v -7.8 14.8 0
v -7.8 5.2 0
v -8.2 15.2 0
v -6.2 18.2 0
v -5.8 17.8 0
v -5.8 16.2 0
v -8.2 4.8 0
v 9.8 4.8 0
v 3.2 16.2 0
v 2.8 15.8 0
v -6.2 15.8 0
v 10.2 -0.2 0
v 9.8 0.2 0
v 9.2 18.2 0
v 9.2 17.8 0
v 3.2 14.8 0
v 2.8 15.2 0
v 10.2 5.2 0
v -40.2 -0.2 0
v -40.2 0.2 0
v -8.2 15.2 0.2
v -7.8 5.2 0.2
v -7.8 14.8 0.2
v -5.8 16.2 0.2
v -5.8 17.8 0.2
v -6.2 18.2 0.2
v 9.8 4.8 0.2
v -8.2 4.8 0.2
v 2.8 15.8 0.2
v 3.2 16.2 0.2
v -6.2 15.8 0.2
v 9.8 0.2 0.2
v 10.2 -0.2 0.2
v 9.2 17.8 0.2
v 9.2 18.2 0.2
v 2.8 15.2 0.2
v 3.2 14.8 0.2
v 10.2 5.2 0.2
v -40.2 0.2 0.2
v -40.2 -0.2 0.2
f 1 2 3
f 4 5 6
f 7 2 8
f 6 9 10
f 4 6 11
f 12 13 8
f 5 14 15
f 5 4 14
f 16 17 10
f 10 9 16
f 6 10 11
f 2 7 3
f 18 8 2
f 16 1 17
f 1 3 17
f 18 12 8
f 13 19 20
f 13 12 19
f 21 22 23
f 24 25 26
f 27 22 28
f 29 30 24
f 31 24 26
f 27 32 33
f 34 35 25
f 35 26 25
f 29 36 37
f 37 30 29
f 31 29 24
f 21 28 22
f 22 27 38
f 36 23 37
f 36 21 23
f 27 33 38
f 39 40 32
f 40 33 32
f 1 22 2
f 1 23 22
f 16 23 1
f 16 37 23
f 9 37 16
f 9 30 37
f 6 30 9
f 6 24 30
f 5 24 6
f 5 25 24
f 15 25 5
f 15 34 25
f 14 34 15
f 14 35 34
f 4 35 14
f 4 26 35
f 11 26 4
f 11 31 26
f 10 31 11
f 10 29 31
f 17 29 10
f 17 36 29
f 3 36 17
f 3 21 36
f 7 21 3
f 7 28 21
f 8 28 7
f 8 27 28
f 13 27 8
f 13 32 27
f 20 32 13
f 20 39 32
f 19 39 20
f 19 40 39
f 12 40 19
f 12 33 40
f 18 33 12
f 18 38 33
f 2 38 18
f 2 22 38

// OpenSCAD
// file: ../../api/v2/reporting.scad
//////////////////////////////////////////////////////////////////////
// LibFile: reporting.scad
// Project: Grid Stack
// FileGroup: API v2 Reporting
// FileSummary: Console report for immutable primitive-trace print recipes.
// Role: Makes the exact material, nozzle, printer status, layer height,
//       trace lengths, repeat distances, and source identity visible.
// Requires: API v2 indexes and parallel-trace/path helpers.
// Exports: report_first_layer_object().
//////////////////////////////////////////////////////////////////////

module report_first_layer_object(object, report_level = "full") {
    material = object[FLO_MATERIAL];
    nozzle = object[FLO_NOZZLE];
    printer = object[FLO_PRINTER];
    process = object[FLO_PROCESS];
    traces = object[FLO_TRACES];
    orientation = object[FLO_ORIENTATION];
    lead_in = object[FLO_LEAD_IN];
    points = parallel_trace_path(traces, orientation, lead_in);

    assert(report_level == "summary" || report_level == "full",
        "Report level must be summary or full.");

    echo("------------------------------------------------------------");
    echo("GRID STACK API V2 SAVED FIRST-LAYER OBJECT");
    echo(str("Object: ", object[FLO_NAME]));
    echo(str("Revision: ", object[FLO_REVISION]));
    echo(str("Source release: ", object[FLO_SOURCE_RELEASE]));
    echo(str("Source commit: ", object[FLO_SOURCE_COMMIT]));
    echo(str("Status: ", object[FLO_STATUS]));
    echo(str("Material: ", material[MAT_FAMILY]));
    echo(str("Nozzle: ", nozzle[NZ_DIAMETER], " mm"));
    echo(str("Layer height: ", process[TP_LAYER_H], " mm"));
    echo(str("Printer record: ", printer[PRN_NAME],
        " (", printer[PRN_STATUS], ")"));
    echo(str("Trace orientation: ", orientation, " degrees"));
    echo(str("Trace count: ", len(traces)));
    echo(str("Trace lengths: ", parallel_trace_lengths(traces)));
    echo(str("Repeat distances: ", trace_repeat_distances(traces)));
    echo(str("Clear gaps: ",
        trace_clear_gaps(traces, nozzle[NZ_DIAMETER])));
    echo(str("Lead-in: ", lead_in, " mm"));
    echo(str("Continuous path length: ", path_length(points), " mm"));

    if (report_level == "full") {
        echo(str("Material record: ", material));
        echo(str("Nozzle record: ", nozzle));
        echo(str("Printer record: ", printer));
        echo(str("Trace-process record: ", process));
        echo(str("Trace records: ", traces));
        echo(str("Ordered path: ", points));
        echo(str("Notes: ", object[FLO_NOTES]));
    }

    echo("------------------------------------------------------------");
}
// file: ../../api/v2/validation.scad
//////////////////////////////////////////////////////////////////////
// LibFile: validation.scad
// Project: Grid Stack
// FileGroup: API v2 Validation
// FileSummary: Validates immutable primitive-trace print recipes.
// Role: Rejects incomplete environments, nonparallel traces, diagonal turns,
//       incompatible API/schema versions, and misleading print records.
// Requires: API v2 indexes, path math, and parallel-trace helpers.
// Exports: validate_first_layer_object().
//////////////////////////////////////////////////////////////////////

function _v2_is_integer(value) = is_num(value) && floor(value) == value;

module _validate_material(material) {
    assert(len(material) == 5,
        "API v2 material record has an unexpected field count.");
    assert(material[MAT_NAME] != "", "Material name cannot be empty.");
    assert(material[MAT_STATUS] == "in_use" ||
           material[MAT_STATUS] == "retired",
        "Material status must be in_use or retired.");
}

module _validate_nozzle(nozzle) {
    assert(len(nozzle) == 5,
        "API v2 nozzle record has an unexpected field count.");
    assert(nozzle[NZ_NAME] != "", "Nozzle name cannot be empty.");
    assert(nozzle[NZ_DIAMETER] > 0,
        "Nozzle diameter must be positive.");
    assert(nozzle[NZ_STATUS] == "in_use" ||
           nozzle[NZ_STATUS] == "retired",
        "Nozzle status must be in_use or retired.");
}

module _validate_printer(printer) {
    assert(len(printer) == 7,
        "API v2 printer record has an unexpected field count.");
    assert(printer[PRN_NAME] != "", "Printer name cannot be empty.");
    assert(printer[PRN_STATUS] == "recorded" ||
           printer[PRN_STATUS] == "unrecorded" ||
           printer[PRN_STATUS] == "retired",
        "Printer status must be recorded, unrecorded, or retired.");

    if (printer[PRN_STATUS] == "recorded") {
        assert(printer[PRN_MANUFACTURER] != "",
            "A recorded printer requires a manufacturer.");
        assert(printer[PRN_MODEL] != "",
            "A recorded printer requires a model.");
    }
}

module _validate_trace_process(process, material, nozzle, printer) {
    assert(len(process) == 8,
        "API v2 trace-process record has an unexpected field count.");
    assert(process[TP_NAME] != "",
        "Trace-process name cannot be empty.");
    assert(process[TP_MATERIAL] == material[MAT_NAME],
        "Trace process material does not match the embedded material.");
    assert(process[TP_NOZZLE] == nozzle[NZ_NAME],
        "Trace process nozzle does not match the embedded nozzle.");
    assert(process[TP_PRINTER] == printer[PRN_NAME],
        "Trace process printer does not match the embedded printer.");
    assert(process[TP_LAYER_H] > 0,
        "Deposited layer height must be positive.");
    assert(process[TP_LAYER_H] <= nozzle[NZ_DIAMETER],
        "Deposited layer height must not exceed nozzle diameter.");
    assert(process[TP_QUALIFICATION] == "owner_tested" ||
           process[TP_QUALIFICATION] == "unqualified",
        "Trace-process qualification must be owner_tested or unqualified.");
    assert(_v2_is_integer(process[TP_REVISION]) &&
           process[TP_REVISION] >= 1,
        "Trace-process revision must be a positive integer.");
}

module _validate_parallel_traces(traces, orientation, trace_width, lead_in) {
    assert(len(traces) >= 1,
        "At least one parallel trace must be configured.");
    assert(orientation == 0 || orientation == 90,
        "Trace orientation must be 0 or 90 degrees.");
    assert(trace_width > 0,
        "Trace width must be positive.");
    assert(lead_in >= 0,
        "Lead-in must be zero or positive.");

    for (i = [0 : len(traces) - 1]) {
        trace = traces[i];
        assert(len(trace) == 3,
            str("Trace ", i,
                " must be [axis_min, axis_max, perpendicular_position]."));
        assert(is_num(trace[PTR_AXIS_MIN]) &&
               is_num(trace[PTR_AXIS_MAX]) &&
               is_num(trace[PTR_OFFSET]),
            str("Trace ", i, " fields must be numeric."));
        assert(trace[PTR_AXIS_MAX] > trace[PTR_AXIS_MIN],
            str("Trace ", i,
                " axis_max must be greater than axis_min."));
    }

    if (len(traces) >= 2) {
        offset_direction = traces[1][PTR_OFFSET] > traces[0][PTR_OFFSET]
            ? 1 : -1;

        for (i = [0 : len(traces) - 2]) {
            repeat_distance = abs(
                traces[i + 1][PTR_OFFSET] - traces[i][PTR_OFFSET]
            );
            next_direction = traces[i + 1][PTR_OFFSET] -
                             traces[i][PTR_OFFSET];

            assert(next_direction * offset_direction > 0,
                "Parallel-trace offsets must remain strictly monotonic.");
            assert(repeat_distance >= trace_width,
                str("Trace repeat distance ", repeat_distance,
                    " is smaller than trace width ", trace_width, "."));
            assert(nearly_equal(
                    trace_path_end_axis(traces[i], i),
                    trace_path_start_axis(traces[i + 1], i + 1)
                ),
                str("Traces ", i, " and ", i + 1,
                    " do not share the endpoint required for a square turn."));
        }
    }

    points = parallel_trace_path(traces, orientation, lead_in);
    assert(len(points) >= 2,
        "Generated path requires at least two points.");
    assert(!path_has_zero_length_segment(points),
        "Generated path contains a zero-length segment.");
    assert(path_is_axis_aligned(points),
        "Generated path must remain axis-aligned.");
    assert(path_start(points) != path_end(points),
        "Generated path must remain open.");
}

// Module: validate_first_layer_object()
// Synopsis: Validates one API v2 immutable first-layer recipe.
module validate_first_layer_object(object) {
    assert(len(object) == 15,
        "API v2 first-layer object has an unexpected field count.");
    assert(object[FLO_NAME] != "",
        "First-layer object name must not be empty.");
    assert(_v2_is_integer(object[FLO_REVISION]) &&
           object[FLO_REVISION] >= 1,
        "First-layer object revision must be a positive integer.");
    assert(object[FLO_REQUIRED_API] == GRID_STACK_API_VERSION,
        str("Recipe requires Grid Stack API ",
            object[FLO_REQUIRED_API], " but loaded API is ",
            GRID_STACK_API_VERSION, "."));
    assert(object[FLO_SCHEMA_VERSION] ==
           GRID_STACK_FIRST_LAYER_SCHEMA_VERSION,
        str("Recipe schema ", object[FLO_SCHEMA_VERSION],
            " is incompatible with loaded schema ",
            GRID_STACK_FIRST_LAYER_SCHEMA_VERSION, "."));
    assert(object[FLO_SOURCE_RELEASE] != "",
        "Recipe must record its source release.");
    assert(object[FLO_SOURCE_COMMIT] != "",
        "Recipe must record its accepted source commit.");
    assert(object[FLO_STATUS] == "calibration" ||
           object[FLO_STATUS] == "printed" ||
           object[FLO_STATUS] == "retired",
        "Recipe status must be calibration, printed, or retired.");

    material = object[FLO_MATERIAL];
    nozzle = object[FLO_NOZZLE];
    printer = object[FLO_PRINTER];
    process = object[FLO_PROCESS];

    _validate_material(material);
    _validate_nozzle(nozzle);
    _validate_printer(printer);
    _validate_trace_process(process, material, nozzle, printer);
    _validate_parallel_traces(
        object[FLO_TRACES],
        object[FLO_ORIENTATION],
        nozzle[NZ_DIAMETER],
        object[FLO_LEAD_IN]
    );

    if (object[FLO_STATUS] == "printed")
        assert(process[TP_QUALIFICATION] == "owner_tested",
            "A printed recipe must use an owner-tested trace process.");

    echo("GRID STACK API V2 FIRST-LAYER VALIDATION: PASS");
}
// file: ../../geometry/trace_layer.scad
//////////////////////////////////////////////////////////////////////
// LibFile: trace_layer.scad
// Project: Grid Stack
// FileGroup: Printable Geometry
// FileSummary: Sweeps one rectangular nozzle trace along an axis-aligned path
//              using square segment ends and square perpendicular turns.
// Role: Creates the first printable Grid Stack primitive: one trace wide and
//       one deposited layer high. It is not a structural strand.
// Requires: An ordered, validated, axis-aligned XY point list.
// Exports: square_trace_path_2d() and printable_trace_layer().
//////////////////////////////////////////////////////////////////////

// Module: _square_trace_segment_2d()
// Synopsis: Creates one centered axis-aligned segment with square end caps.
module _square_trace_segment_2d(a, b, width) {
    horizontal = nearly_equal(a[1], b[1]);
    vertical = nearly_equal(a[0], b[0]);

    assert(horizontal || vertical,
        "Printable trace segments must be horizontal or vertical.");
    assert(!nearly_equal(point_distance_2d(a, b), 0),
        "Printable trace segments must have nonzero length.");

    if (horizontal)
        translate([min(a[0], b[0]) - width / 2, a[1] - width / 2])
            square([abs(b[0] - a[0]) + width, width]);
    else
        translate([a[0] - width / 2, min(a[1], b[1]) - width / 2])
            square([width, abs(b[1] - a[1]) + width]);
}

// Module: square_trace_path_2d()
// Synopsis: Unions square-ended segments into one continuous 2D trace.
module square_trace_path_2d(points, width) {
    assert(len(points) >= 2,
        "A printable trace path requires at least two points.");
    assert(width > 0,
        "Printable trace width must be positive.");

    union()
        for (i = [0 : len(points) - 2])
            _square_trace_segment_2d(points[i], points[i + 1], width);
}

// Module: printable_trace_layer()
// Synopsis: Extrudes one trace-width path to one deposited-layer height.
// Description:
//   The start, termination, and every perpendicular turn remain square.
//   This primitive intentionally represents one nozzle trace and one layer.
module printable_trace_layer(points, trace_width, trace_height) {
    assert(trace_height > 0,
        "Printable trace height must be positive.");

    linear_extrude(height = trace_height, convexity = 10)
        square_trace_path_2d(points, trace_width);
}
// file: ../../geometry/path_preview.scad
//////////////////////////////////////////////////////////////////////
// LibFile: path_preview.scad
// Project: Grid Stack
// FileGroup: Diagnostic Geometry
// FileSummary: Displays an ordered centerline, point order, start/end markers,
//              and the non-printing coupon envelope.
// Role: Supports path inspection only. It is not structural-strand geometry.
// Requires: An ordered list of XY points.
// Exports: diagnostic_path_preview().
//////////////////////////////////////////////////////////////////////

module _preview_segment_2d(a, b, width) {
    hull() {
        translate(a) circle(d = width, $fn = 16);
        translate(b) circle(d = width, $fn = 16);
    }
}

module _preview_polyline_2d(points, width) {
    for (i = [0 : len(points) - 2])
        _preview_segment_2d(points[i], points[i + 1], width);
}

module _preview_point_label(point, index, label_size) {
    translate([point[0] + label_size * 0.35, point[1] + label_size * 0.15])
        text(str(index), size = label_size, halign = "left", valign = "bottom");
}

// Module: diagnostic_path_preview()
// Synopsis: Renders a deliberately thin, non-printable path diagnostic.
// Description:
//   Point 0 is the lead-in start. The last point is the only path end.
//   The translucent rectangle is an envelope reference, not a perimeter path.
module diagnostic_path_preview(
    points,
    boundary_size,
    show_envelope = true,
    show_point_numbers = true,
    line_width = 0.18,
    marker_diameter = 1.2,
    label_size = 1.5
) {
    if (show_envelope)
        %color([0.75, 0.75, 0.75, 0.25])
            linear_extrude(height = 0.02)
                square(boundary_size);

    color("orange")
        linear_extrude(height = 0.08)
            _preview_polyline_2d(points, line_width);

    color("green")
        translate([points[0][0], points[0][1], 0])
            cylinder(h = 0.12, d = marker_diameter, $fn = 24);

    color("red")
        translate([points[len(points) - 1][0], points[len(points) - 1][1], 0])
            cylinder(h = 0.12, d = marker_diameter, $fn = 24);

    if (show_point_numbers)
        color("black")
            linear_extrude(height = 0.1)
                for (i = [0 : len(points) - 1])
                    _preview_point_label(points[i], i, label_size);
}
// file: ../../paths/parallel_traces.scad
//////////////////////////////////////////////////////////////////////
// LibFile: parallel_traces.scad
// Project: Grid Stack
// FileGroup: Path Generation
// FileSummary: Converts configurable parallel-trace records into one ordered,
//              continuous path with square perpendicular connectors.
// Role: Treats every trace length and repeat distance as independent data.
//       No equal spacing, equal length, symmetry, or square-wave repetition is
//       implied by this generator.
// Requires: Path mathematics and parallel-trace field indexes.
// Exports: parallel_trace_path(), trace_axis_length(), trace_repeat_distances(),
//          trace_clear_gaps(), and trace-path endpoint helpers.
//////////////////////////////////////////////////////////////////////

// Function: trace_axis_length()
// Synopsis: Returns the independently configured length of one parallel trace.
function trace_axis_length(trace) = trace[PTR_AXIS_MAX] - trace[PTR_AXIS_MIN];

// Function: trace_path_start_axis()
// Synopsis: Returns the traversal start coordinate for a trace by parity.
// Description:
//   Even traces run from axis_min to axis_max. Odd traces run from axis_max
//   to axis_min. This alternation preserves one continuous serpentine path.
function trace_path_start_axis(trace, index) =
    index % 2 == 0 ? trace[PTR_AXIS_MIN] : trace[PTR_AXIS_MAX];

// Function: trace_path_end_axis()
// Synopsis: Returns the traversal end coordinate for a trace by parity.
function trace_path_end_axis(trace, index) =
    index % 2 == 0 ? trace[PTR_AXIS_MAX] : trace[PTR_AXIS_MIN];

// Function: _parallel_trace_point()
// Synopsis: Maps one axis coordinate and one perpendicular offset into XY.
function _parallel_trace_point(axis_value, offset, orientation) =
    orientation == 0 ? [axis_value, offset] : [offset, axis_value];

// Function: _parallel_trace_points()
// Synopsis: Recursively expands trace records into entry and exit points.
function _parallel_trace_points(traces, orientation, index = 0) =
    index >= len(traces)
        ? []
        : let(
            trace = traces[index],
            offset = trace[PTR_OFFSET],
            start_point = _parallel_trace_point(
                trace_path_start_axis(trace, index), offset, orientation
            ),
            end_point = _parallel_trace_point(
                trace_path_end_axis(trace, index), offset, orientation
            )
        )
        concat(
            [start_point, end_point],
            _parallel_trace_points(traces, orientation, index + 1)
        );

// Function: parallel_trace_path()
// Synopsis: Returns one open ordered path through all configured traces.
// Arguments:
//   traces = Records of [axis_min, axis_max, perpendicular_position].
//   orientation = 0 for X-running traces or 90 for Y-running traces.
//   lead_in = Straight entry length before the first trace, in millimeters.
// Description:
//   Adjacent records must share the alternating endpoint used by their turn.
//   The path therefore connects traces only with perpendicular square turns.
//   Every trace length and every offset difference may be different.
function parallel_trace_path(traces, orientation = 0, lead_in = 0) =
    assert(len(traces) >= 1,
        "A parallel-trace path requires at least one trace record.")
    assert(orientation == 0 || orientation == 90,
        "Parallel-trace orientation must be 0 or 90 degrees.")
    assert(lead_in >= 0,
        "Parallel-trace lead-in must be zero or positive.")
    let(
        body = _parallel_trace_points(traces, orientation),
        first = body[0],
        lead_start = orientation == 0
            ? [first[0] - lead_in, first[1]]
            : [first[0], first[1] - lead_in]
    )
    lead_in > 0 ? concat([lead_start], body) : body;

// Function: trace_repeat_distances()
// Synopsis: Returns centerline-to-centerline repeat distances between traces.
function trace_repeat_distances(traces) =
    len(traces) < 2
        ? []
        : [for (i = [0 : len(traces) - 2])
            abs(traces[i + 1][PTR_OFFSET] - traces[i][PTR_OFFSET])];

// Function: trace_clear_gaps()
// Synopsis: Returns clear edge-to-edge gaps for a specified trace width.
function trace_clear_gaps(traces, trace_width) =
    [for (distance = trace_repeat_distances(traces))
        distance - trace_width];

// Function: parallel_trace_lengths()
// Synopsis: Returns the independently configured lengths of all traces.
function parallel_trace_lengths(traces) =
    [for (trace = traces) trace_axis_length(trace)];

// Function: path_bounds_2d()
// Synopsis: Returns [min_x, max_x, min_y, max_y] for an ordered XY path.
function path_bounds_2d(points) = [
    min([for (point = points) point[0]]),
    max([for (point = points) point[0]]),
    min([for (point = points) point[1]]),
    max([for (point = points) point[1]])
];
// file: ../../lib/path_math.scad
//////////////////////////////////////////////////////////////////////
// LibFile: path_math.scad
// Project: Grid Stack
// FileGroup: Path Mathematics
// FileSummary: Pure helpers for ordered two-dimensional nozzle paths.
// Role: Measures and inspects point lists without creating geometry or
//       selecting project records.
// Requires: nearly_equal() from list_math.scad.
// Exports: Point, segment, path-length, and continuity helpers.
//////////////////////////////////////////////////////////////////////

// Function: point_distance_2d()
// Synopsis: Returns the Euclidean distance between two XY points.
function point_distance_2d(a, b) =
    sqrt(pow(b[0] - a[0], 2) + pow(b[1] - a[1], 2));

// Function: segment_is_axis_aligned()
// Synopsis: True when a segment is horizontal or vertical.
function segment_is_axis_aligned(a, b) =
    nearly_equal(a[0], b[0]) || nearly_equal(a[1], b[1]);

// Function: path_segment_lengths()
// Synopsis: Returns one length for every consecutive point pair.
function path_segment_lengths(points) =
    len(points) < 2
        ? []
        : [for (i = [0 : len(points) - 2])
            point_distance_2d(points[i], points[i + 1])];

// Function: path_length()
// Synopsis: Returns the total centerline length of an ordered path.
function path_length(points, i = 0) =
    i >= len(points) - 1
        ? 0
        : point_distance_2d(points[i], points[i + 1]) +
          path_length(points, i + 1);

// Function: path_has_zero_length_segment()
// Synopsis: Detects repeated consecutive points.
function path_has_zero_length_segment(points, i = 0) =
    i >= len(points) - 1
        ? false
        : nearly_equal(point_distance_2d(points[i], points[i + 1]), 0)
            ? true
            : path_has_zero_length_segment(points, i + 1);

// Function: path_is_axis_aligned()
// Synopsis: Verifies that every segment is horizontal or vertical.
function path_is_axis_aligned(points, i = 0) =
    i >= len(points) - 1
        ? true
        : segment_is_axis_aligned(points[i], points[i + 1]) &&
          path_is_axis_aligned(points, i + 1);

function path_start(points) = points[0];
function path_end(points) = points[len(points) - 1];
// file: ../../lib/list_math.scad
//////////////////////////////////////////////////////////////////////
// LibFile: list_math.scad
// Project: Grid Stack
// FileGroup: Utilities
// FileSummary: Small pure list and numeric helpers.
// Role: Supplies generic operations with no configuration lookup or geometry.
// Exports: sum_values(), nearly_equal(), is_integer_value(), reversed().
//////////////////////////////////////////////////////////////////////

function sum_values(values, index = 0) =
    index >= len(values) ? 0 : values[index] + sum_values(values, index + 1);

function nearly_equal(a, b, tolerance = 0.0001) = abs(a - b) <= tolerance;

function is_integer_value(value) = nearly_equal(value, round(value));

function reversed(values) =
    len(values) == 0 ? [] :
    [for (index = [len(values) - 1 : -1 : 0]) values[index]];
// file: ../../api/v2/schema.scad
//////////////////////////////////////////////////////////////////////
// LibFile: schema.scad
// Project: Grid Stack
// FileGroup: API v2 Data Model
// FileSummary: Constructors for immutable first-layer printing records.
// Role: Separates a primitive nozzle trace from the API v1 structural-strand
//       process, which contains bridge and multi-pass fields irrelevant to a
//       one-layer calibration or anti-warp underlay.
// Exports: material_spec(), nozzle_spec(), printer_spec(),
//          trace_process_profile(), and first_layer_object().
//////////////////////////////////////////////////////////////////////

// Function: material_spec()
// Synopsis: Constructs one exact material-family identity.
function material_spec(name, family, flexibility, status, notes = "") =
    [name, family, flexibility, status, notes];

// Function: nozzle_spec()
// Synopsis: Constructs one exact nozzle-hardware identity.
function nozzle_spec(name, diameter, construction, status, notes = "") =
    [name, diameter, construction, status, notes];

// Function: printer_spec()
// Synopsis: Constructs one printer-hardware identity.
// Description:
//   Use a stable local name even when full hardware details are unavailable.
//   An explicitly unrecorded printer is preferable to inventing a model.
function printer_spec(
    name,
    manufacturer,
    model,
    motion_system,
    build_surface,
    status,
    notes = ""
) = [
    name,
    manufacturer,
    model,
    motion_system,
    build_surface,
    status,
    notes
];

// Function: trace_process_profile()
// Synopsis: Constructs a qualified primitive-trace printing environment.
// Description:
//   This record intentionally excludes structural width passes, structural
//   height passes, and bridge limits. One primitive trace is defined only by
//   material, nozzle, printer, and deposited layer height.
function trace_process_profile(
    name,
    material_name,
    nozzle_name,
    printer_name,
    layer_height,
    qualification,
    revision,
    notes = ""
) = [
    name,
    material_name,
    nozzle_name,
    printer_name,
    layer_height,
    qualification,
    revision,
    notes
];

// Function: first_layer_object()
// Synopsis: Constructs one immutable first-layer geometry recipe.
// Description:
//   traces contains [axis_min, axis_max, perpendicular_position] records.
//   source_commit identifies the accepted source state from which this recipe
//   was promoted. A changed printed object receives a new file and revision.
function first_layer_object(
    name,
    revision,
    required_api_version,
    first_layer_schema_version,
    source_release,
    source_commit,
    material,
    nozzle,
    printer,
    process,
    traces,
    orientation,
    lead_in,
    status,
    notes = ""
) = [
    name,
    revision,
    required_api_version,
    first_layer_schema_version,
    source_release,
    source_commit,
    material,
    nozzle,
    printer,
    process,
    traces,
    orientation,
    lead_in,
    status,
    notes
];
// file: ../../api/v2/indices.scad
//////////////////////////////////////////////////////////////////////
// LibFile: indices.scad
// Project: Grid Stack
// FileGroup: API v2 Data Model
// FileSummary: Field indexes for immutable first-layer print records.
// Role: Keeps API v2 records readable without coupling them to the older
//       structural-strand schema used by Grid Stack API version 1.
// Exports: Material, nozzle, printer, trace-process, parallel-trace, and
//          saved first-layer field-index constants.
//////////////////////////////////////////////////////////////////////

// Material identity
MAT_NAME = 0;
MAT_FAMILY = 1;
MAT_FLEXIBILITY = 2;
MAT_STATUS = 3;
MAT_NOTES = 4;

// Nozzle hardware
NZ_NAME = 0;
NZ_DIAMETER = 1;
NZ_CONSTRUCTION = 2;
NZ_STATUS = 3;
NZ_NOTES = 4;

// Printer hardware
PRN_NAME = 0;
PRN_MANUFACTURER = 1;
PRN_MODEL = 2;
PRN_MOTION_SYSTEM = 3;
PRN_BUILD_SURFACE = 4;
PRN_STATUS = 5;
PRN_NOTES = 6;

// Single-trace process
TP_NAME = 0;
TP_MATERIAL = 1;
TP_NOZZLE = 2;
TP_PRINTER = 3;
TP_LAYER_H = 4;
TP_QUALIFICATION = 5;
TP_REVISION = 6;
TP_NOTES = 7;

// Parallel-trace record
PTR_AXIS_MIN = 0;
PTR_AXIS_MAX = 1;
PTR_OFFSET = 2;

// Saved first-layer object
FLO_NAME = 0;
FLO_REVISION = 1;
FLO_REQUIRED_API = 2;
FLO_SCHEMA_VERSION = 3;
FLO_SOURCE_RELEASE = 4;
FLO_SOURCE_COMMIT = 5;
FLO_MATERIAL = 6;
FLO_NOZZLE = 7;
FLO_PRINTER = 8;
FLO_PROCESS = 9;
FLO_TRACES = 10;
FLO_ORIENTATION = 11;
FLO_LEAD_IN = 12;
FLO_STATUS = 13;
FLO_NOTES = 14;
// file: ../../api/grid_stack_v2.scad
//////////////////////////////////////////////////////////////////////
// LibFile: grid_stack_v2.scad
// Project: Grid Stack
// FileGroup: Versioned Public Interface
// FileSummary: Immutable API version 2 for primitive first-layer print
//              recipes with material, nozzle, printer, and trace-process data.
// Role: Lets saved first-layer objects avoid the structural-strand process
//       fields required by API version 1 while preserving the v1 interface.
// Exports: API/schema constants, record constructors,
//          validate_first_layer_object(), report_first_layer_object(), and
//          first_layer_render().
//////////////////////////////////////////////////////////////////////

GRID_STACK_API_VERSION = 2;
GRID_STACK_FIRST_LAYER_SCHEMA_VERSION = 2;
GRID_STACK_RELEASE = "0.7.0";

include <v2/indices.scad>
include <v2/schema.scad>

include <../lib/list_math.scad>
include <../lib/path_math.scad>
include <../paths/parallel_traces.scad>
include <../geometry/path_preview.scad>
include <../geometry/trace_layer.scad>

include <v2/validation.scad>
include <v2/reporting.scad>

// Module: first_layer_render()
// Synopsis: Validates, reports, and renders one API v2 first-layer recipe.
// Arguments:
//   object = Record returned by first_layer_object().
//   mode = trace_layer, path_debug, or report_only.
//   report_level = summary or full.
//   show_path_point_numbers = Diagnostic-only point labels.
module first_layer_render(
    object,
    mode = "trace_layer",
    report_level = "full",
    show_path_point_numbers = true
) {
    validate_first_layer_object(object);
    report_first_layer_object(object, report_level);

    nozzle = object[FLO_NOZZLE];
    process = object[FLO_PROCESS];
    points = parallel_trace_path(
        object[FLO_TRACES],
        object[FLO_ORIENTATION],
        object[FLO_LEAD_IN]
    );

    if (mode == "trace_layer")
        printable_trace_layer(
            points = points,
            trace_width = nozzle[NZ_DIAMETER],
            trace_height = process[TP_LAYER_H]
        );
    else if (mode == "path_debug")
        diagnostic_path_preview(
            points = points,
            boundary_size = [0, 0],
            show_envelope = false,
            show_point_numbers = show_path_point_numbers
        );
    else if (mode == "report_only")
        echo("Grid Stack API v2 report-only mode: no geometry generated.");
    else
        assert(false, str("Unknown API v2 first-layer mode: ", mode));
}
// main file
//////////////////////////////////////////////////////////////////////
// LibFile: first-layer-0u2Z-variable-50x18-pla-plus-0p4-v1.scad
// Project: Grid Stack
// FileGroup: Immutable Printed Object
// FileSummary: Exact PLA+ 0.4 mm nozzle, 0.2 mm layer recipe for the accepted
//              five-trace variable first-layer calibration/underlay object.
// Role: Permanently reconstructs the reported successful PLA+ print without
//       Customizer state or mutable catalog lookup.
// SourceCommit: 79f36da
// Requires: Grid Stack API version 2 and first-layer schema version 2.
// Output: One continuous 0.4 mm wide by 0.2 mm high trace layer.
//////////////////////////////////////////////////////////////////////

include <../../api/grid_stack_v2.scad>

assert(GRID_STACK_API_VERSION == 2,
    "This recipe requires Grid Stack API version 2.");
assert(GRID_STACK_FIRST_LAYER_SCHEMA_VERSION == 2,
    "This recipe requires first-layer schema version 2.");

saved_material = material_spec(
    name = "PLA_PLUS",
    family = "PLA+",
    flexibility = "rigid",
    status = "in_use",
    notes = "Material family reported successful for this first-layer object."
);

saved_nozzle = nozzle_spec(
    name = "BRASS_0P4",
    diameter = 0.4,
    construction = "brass",
    status = "in_use",
    notes = "Exact nominal nozzle diameter used by the geometry recipe."
);

saved_printer = printer_spec(
    name = "UNRECORDED_PRINTER_R1",
    manufacturer = "",
    model = "",
    motion_system = "",
    build_surface = "",
    status = "unrecorded",
    notes = "The successful printer hardware was not identified when this recipe was promoted."
);

saved_process = trace_process_profile(
    name = "PLA_PLUS_0P4_LH0P2_TRACE_R1",
    material_name = "PLA_PLUS",
    nozzle_name = "BRASS_0P4",
    printer_name = "UNRECORDED_PRINTER_R1",
    layer_height = 0.2,
    qualification = "owner_tested",
    revision = 1,
    notes = "Primitive trace process only; no structural-strand or bridge claim."
);

saved_traces = [
    [-10, 10,  0],
    [ -8, 10,  5],
    [ -8,  3, 15],
    [ -6,  3, 16],
    [ -6,  9, 18]
];

saved_first_layer = first_layer_object(
    name = "FIRST_LAYER_0U2Z_VARIABLE_50X18_PLA_PLUS_0P4_V1",
    revision = 1,
    required_api_version = 2,
    first_layer_schema_version = 2,
    source_release = "0.7.0",
    source_commit = "79f36da",
    material = saved_material,
    nozzle = saved_nozzle,
    printer = saved_printer,
    process = saved_process,
    traces = saved_traces,
    orientation = 0,
    lead_in = 30,
    status = "printed",
    notes = "Reported successful in PLA+. Create a new file and revision for any change."
);

first_layer_render(
    saved_first_layer,
    mode = "trace_layer",
    report_level = "full",
    show_path_point_numbers = false
);
